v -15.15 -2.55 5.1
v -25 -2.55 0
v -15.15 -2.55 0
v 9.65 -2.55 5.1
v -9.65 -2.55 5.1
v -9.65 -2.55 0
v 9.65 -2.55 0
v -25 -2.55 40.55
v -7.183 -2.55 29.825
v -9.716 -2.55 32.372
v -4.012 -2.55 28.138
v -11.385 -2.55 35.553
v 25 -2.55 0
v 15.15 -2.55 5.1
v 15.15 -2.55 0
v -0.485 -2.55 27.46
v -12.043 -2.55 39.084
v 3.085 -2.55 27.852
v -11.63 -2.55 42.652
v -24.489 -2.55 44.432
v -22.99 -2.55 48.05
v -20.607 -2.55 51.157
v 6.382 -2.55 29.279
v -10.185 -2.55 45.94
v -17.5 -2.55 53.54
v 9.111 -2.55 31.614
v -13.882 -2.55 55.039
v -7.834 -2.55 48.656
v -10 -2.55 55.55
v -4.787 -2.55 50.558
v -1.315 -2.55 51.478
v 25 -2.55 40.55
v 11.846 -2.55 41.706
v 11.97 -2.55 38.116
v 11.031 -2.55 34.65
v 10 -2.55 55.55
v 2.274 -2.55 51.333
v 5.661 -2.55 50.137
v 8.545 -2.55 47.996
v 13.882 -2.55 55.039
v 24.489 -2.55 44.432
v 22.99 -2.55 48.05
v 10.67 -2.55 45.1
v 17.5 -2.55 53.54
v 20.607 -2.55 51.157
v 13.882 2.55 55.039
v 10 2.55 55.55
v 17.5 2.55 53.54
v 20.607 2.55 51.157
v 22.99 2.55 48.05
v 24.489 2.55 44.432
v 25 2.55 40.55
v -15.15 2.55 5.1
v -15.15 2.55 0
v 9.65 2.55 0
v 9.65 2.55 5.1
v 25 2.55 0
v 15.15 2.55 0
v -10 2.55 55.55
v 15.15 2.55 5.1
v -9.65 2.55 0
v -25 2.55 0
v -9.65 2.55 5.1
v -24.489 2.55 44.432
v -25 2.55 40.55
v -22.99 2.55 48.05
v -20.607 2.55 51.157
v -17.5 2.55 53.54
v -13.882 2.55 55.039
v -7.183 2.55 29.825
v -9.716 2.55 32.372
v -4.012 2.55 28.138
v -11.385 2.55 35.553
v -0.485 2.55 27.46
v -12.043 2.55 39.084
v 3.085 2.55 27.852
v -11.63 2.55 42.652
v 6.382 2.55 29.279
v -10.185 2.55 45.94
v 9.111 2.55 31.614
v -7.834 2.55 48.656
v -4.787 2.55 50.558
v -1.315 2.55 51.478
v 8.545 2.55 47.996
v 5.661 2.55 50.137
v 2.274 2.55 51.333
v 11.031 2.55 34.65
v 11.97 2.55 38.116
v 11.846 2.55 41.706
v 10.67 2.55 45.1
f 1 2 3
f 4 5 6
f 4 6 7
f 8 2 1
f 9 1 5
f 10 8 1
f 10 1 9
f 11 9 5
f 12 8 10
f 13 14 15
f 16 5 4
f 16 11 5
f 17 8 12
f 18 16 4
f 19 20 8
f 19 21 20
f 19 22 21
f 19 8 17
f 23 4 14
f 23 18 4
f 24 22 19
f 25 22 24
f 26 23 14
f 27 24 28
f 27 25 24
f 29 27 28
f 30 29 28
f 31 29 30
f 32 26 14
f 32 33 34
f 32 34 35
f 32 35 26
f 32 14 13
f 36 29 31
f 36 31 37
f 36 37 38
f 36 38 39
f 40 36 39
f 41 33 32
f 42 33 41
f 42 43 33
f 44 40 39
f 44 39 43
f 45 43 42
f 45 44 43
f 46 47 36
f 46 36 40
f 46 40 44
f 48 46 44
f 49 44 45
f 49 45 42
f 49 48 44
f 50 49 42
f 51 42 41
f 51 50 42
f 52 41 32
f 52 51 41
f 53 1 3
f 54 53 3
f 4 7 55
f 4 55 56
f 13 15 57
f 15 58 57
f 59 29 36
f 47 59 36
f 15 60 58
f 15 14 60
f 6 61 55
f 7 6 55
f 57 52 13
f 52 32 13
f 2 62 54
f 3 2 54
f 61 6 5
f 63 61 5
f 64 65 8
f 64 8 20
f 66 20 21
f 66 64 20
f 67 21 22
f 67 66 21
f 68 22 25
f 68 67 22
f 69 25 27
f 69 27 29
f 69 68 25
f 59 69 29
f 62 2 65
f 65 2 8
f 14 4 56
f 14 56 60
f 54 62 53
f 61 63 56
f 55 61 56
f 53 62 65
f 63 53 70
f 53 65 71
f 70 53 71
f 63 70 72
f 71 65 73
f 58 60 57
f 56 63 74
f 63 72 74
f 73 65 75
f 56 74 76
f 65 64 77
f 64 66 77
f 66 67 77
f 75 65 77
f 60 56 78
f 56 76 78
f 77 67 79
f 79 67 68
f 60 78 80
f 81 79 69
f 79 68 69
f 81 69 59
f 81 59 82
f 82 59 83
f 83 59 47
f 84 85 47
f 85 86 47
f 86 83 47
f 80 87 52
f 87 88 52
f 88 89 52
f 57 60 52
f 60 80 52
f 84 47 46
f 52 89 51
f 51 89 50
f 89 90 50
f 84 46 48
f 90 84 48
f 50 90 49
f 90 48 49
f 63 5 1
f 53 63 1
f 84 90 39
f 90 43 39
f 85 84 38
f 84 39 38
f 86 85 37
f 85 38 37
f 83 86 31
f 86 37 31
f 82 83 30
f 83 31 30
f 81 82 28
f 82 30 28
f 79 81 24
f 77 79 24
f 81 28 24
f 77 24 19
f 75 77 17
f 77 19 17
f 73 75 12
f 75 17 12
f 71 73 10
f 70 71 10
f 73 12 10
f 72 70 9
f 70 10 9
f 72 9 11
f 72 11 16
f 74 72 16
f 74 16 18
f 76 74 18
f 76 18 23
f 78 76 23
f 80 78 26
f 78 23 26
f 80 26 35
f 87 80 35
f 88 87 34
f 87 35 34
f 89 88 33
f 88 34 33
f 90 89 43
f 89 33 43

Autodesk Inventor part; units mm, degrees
ref_plane "YZ Plane" through (0, 0, 0) normal (1, 0, 0) x (0, 1, 0)
ref_plane "XZ Plane" through (0, 0, 0) normal (0, 1, 0) x (-1, 0, 0)
ref_plane "XY Plane" through (0, 0, 0) normal (0, 0, 1) x (1, 0, 0)
sketch "Sketch1" plane through (0, 0, 0) normal (0, 0, 1) x (1, 0, 0)
  line L0 (25, -2.55) -> (-25, -2.55)
  line L1 (-25, -2.55) -> (-25, 2.55)
  line L2 (-25, 2.55) -> (25, 2.55)
  line L3 (25, 2.55) -> (25, -2.55)
  line L4 (25, -2.55) -> (-25, 2.55) construction
  line L5 (-25, -2.55) -> (25, 2.55) construction
  point P0 (0, 0)
  dimension "d0" = 50
  dimension "d1" = 5.1
extrude "Extrusion1" add sketch "Sketch1" along normal blind 45.1
sketch "Sketch2" plane through (-25, -2.55, 0) normal (0, -1, 0) x (1, 0, 0)
  line L0 (50, 0) -> (0, 0) projected
  line L1 (9.85, 0) -> (15.35, 0)
  line L2 (15.35, 0) -> (15.35, 5.1)
  line L3 (15.35, 5.1) -> (9.85, 5.1)
  line L4 (9.85, 5.1) -> (9.85, 0)
  line L5 (40.15, 0) -> (34.65, 0)
  line L6 (34.65, 0) -> (34.65, 5.1)
  line L7 (34.65, 5.1) -> (40.15, 5.1)
  line L8 (40.15, 5.1) -> (40.15, 0)
  line L9 (50, 0) -> (50, 45.1) projected
  line L10 (0, 0) -> (0, 45.1) projected
  point P0 (25, 0)
  point P1 (40.15, 2.55)
  dimension "d5" = 5.1
  dimension "d9" = 5.1
  dimension "d17" = 9.85
  dimension "d25" = 5.5
  dimension "d26" = 5.5
  dimension "d27" = 9.85
extrude "Extrusion2" cut sketch "Sketch2" against normal blind 45.1
sketch "Sketch3" plane through (-25, -2.55, 45.1) normal (0, -1, 0) x (1, 0, 0)
  circle A0 centre (25, -5.6) radius 3.45
  line L0 (0, 0) -> (50, 0) projected
  circle A1 centre (25, -5.6) radius 12.05
  line L1 (50, 0) -> (0, 0)
  line L2 (0, 0) -> (0, 10.45)
  line L3 (0, 10.45) -> (50, 10.45)
  line L4 (50, 10.45) -> (50, 0)
  line L5 (0, -45.1) -> (0, 0) projected
  point P0 (25, -45.1)
  point P1 (14.3303, 0)
  point P2 (35.6697, 0)
  dimension "d12" = 6.9
  dimension "d13" = 5.6
  dimension "d14" = 25
  dimension "d19" = 24.1
  dimension "d20" = 16.05
extrude "Extrusion3" cut sketch "Sketch3" against normal blind 45.1 contours A0 | L0 A1 picked at (25.1386, -0.7251)
extrude "Extrusion4" add sketch "Sketch3" against normal up to surface (5.1 mm away) contours L2 L3 L4 L0 A1
fillet "Fillet1" radius 15 2 edges at (25, 0, 55.55) (-25, 0, 55.55)
equation "\"d26\" = d25"
equation "\"d27\" = d17"
properties part number "motorholder1A" material "Polycarbonate, Smoke"
